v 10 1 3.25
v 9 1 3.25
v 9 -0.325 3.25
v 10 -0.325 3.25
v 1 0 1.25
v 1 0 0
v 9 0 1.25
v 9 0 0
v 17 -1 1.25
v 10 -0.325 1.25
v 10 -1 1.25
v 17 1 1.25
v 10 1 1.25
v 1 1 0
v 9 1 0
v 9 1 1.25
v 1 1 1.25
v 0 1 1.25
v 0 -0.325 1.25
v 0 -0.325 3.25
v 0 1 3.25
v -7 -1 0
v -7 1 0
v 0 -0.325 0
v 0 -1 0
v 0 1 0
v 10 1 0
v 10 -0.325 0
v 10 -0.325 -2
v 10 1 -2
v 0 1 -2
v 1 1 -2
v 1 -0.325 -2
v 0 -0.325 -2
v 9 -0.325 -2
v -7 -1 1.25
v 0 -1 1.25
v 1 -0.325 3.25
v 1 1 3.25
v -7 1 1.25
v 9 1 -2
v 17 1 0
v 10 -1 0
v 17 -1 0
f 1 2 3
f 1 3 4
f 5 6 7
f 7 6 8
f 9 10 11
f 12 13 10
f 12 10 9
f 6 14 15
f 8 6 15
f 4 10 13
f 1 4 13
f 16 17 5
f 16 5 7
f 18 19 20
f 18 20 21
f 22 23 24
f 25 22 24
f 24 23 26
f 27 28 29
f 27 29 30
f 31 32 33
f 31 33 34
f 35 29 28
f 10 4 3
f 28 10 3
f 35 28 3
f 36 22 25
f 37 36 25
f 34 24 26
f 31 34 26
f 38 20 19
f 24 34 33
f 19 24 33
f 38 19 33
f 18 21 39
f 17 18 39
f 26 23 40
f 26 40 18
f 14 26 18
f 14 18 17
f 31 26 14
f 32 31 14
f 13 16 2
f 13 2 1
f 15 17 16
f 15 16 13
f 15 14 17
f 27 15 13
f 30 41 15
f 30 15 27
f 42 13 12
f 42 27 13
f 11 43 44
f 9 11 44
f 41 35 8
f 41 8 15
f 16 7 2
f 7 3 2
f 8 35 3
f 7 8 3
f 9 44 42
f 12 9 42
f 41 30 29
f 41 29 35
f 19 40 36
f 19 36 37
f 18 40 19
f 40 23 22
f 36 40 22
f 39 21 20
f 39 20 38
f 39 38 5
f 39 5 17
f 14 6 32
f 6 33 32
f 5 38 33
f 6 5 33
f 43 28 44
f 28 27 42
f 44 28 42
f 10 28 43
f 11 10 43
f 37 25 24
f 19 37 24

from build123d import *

# Parameters (mm, degrees)
BOSS_EXTRUDE1_DEPTH = 1.25
SKETCH4_W           = 1
SKETCH4_H           = 1.325
BOSS_EXTRUDE4_DEPTH = 2
SKETCH5_W           = 1
SKETCH5_H           = 1.325
BOSS_EXTRUDE5_DEPTH = 2


with BuildPart() as part:
    # Sketch1 → Boss-Extrude1 (new body)
    with BuildSketch(Plane.XY):
        Polygon((1, 0), (9, 0), (9, -0.325), (10, -0.325), (10, -1), (17, -1), (17, 1), (10, 1), (0, 1), (-7, 1), (-7, -1), (0, -1), (0, -0.325), (1, -0.325), align=None)
    extrude(amount=BOSS_EXTRUDE1_DEPTH)

    # Sketch4 → Boss-Extrude4 (add)
    with BuildSketch(Plane(origin=(0, 0, 0), x_dir=(-1, 0, 0), z_dir=(0, 0, -1))):
        with Locations((-9.5, 0.3375)):
            Rectangle(SKETCH4_W, SKETCH4_H)
        with Locations((-0.5, 0.3375)):
            Rectangle(SKETCH4_W, SKETCH4_H)
    extrude(amount=BOSS_EXTRUDE4_DEPTH)

    # Sketch5 → Boss-Extrude5 (add)
    with BuildSketch(Plane.XY.offset(1.25)):
        with Locations((0.5, 0.3375)):
            Rectangle(SKETCH5_W, SKETCH5_H)
        with Locations((9.5, 0.3375)):
            Rectangle(SKETCH5_W, SKETCH5_H)
    extrude(amount=BOSS_EXTRUDE5_DEPTH)


solid = part.part
